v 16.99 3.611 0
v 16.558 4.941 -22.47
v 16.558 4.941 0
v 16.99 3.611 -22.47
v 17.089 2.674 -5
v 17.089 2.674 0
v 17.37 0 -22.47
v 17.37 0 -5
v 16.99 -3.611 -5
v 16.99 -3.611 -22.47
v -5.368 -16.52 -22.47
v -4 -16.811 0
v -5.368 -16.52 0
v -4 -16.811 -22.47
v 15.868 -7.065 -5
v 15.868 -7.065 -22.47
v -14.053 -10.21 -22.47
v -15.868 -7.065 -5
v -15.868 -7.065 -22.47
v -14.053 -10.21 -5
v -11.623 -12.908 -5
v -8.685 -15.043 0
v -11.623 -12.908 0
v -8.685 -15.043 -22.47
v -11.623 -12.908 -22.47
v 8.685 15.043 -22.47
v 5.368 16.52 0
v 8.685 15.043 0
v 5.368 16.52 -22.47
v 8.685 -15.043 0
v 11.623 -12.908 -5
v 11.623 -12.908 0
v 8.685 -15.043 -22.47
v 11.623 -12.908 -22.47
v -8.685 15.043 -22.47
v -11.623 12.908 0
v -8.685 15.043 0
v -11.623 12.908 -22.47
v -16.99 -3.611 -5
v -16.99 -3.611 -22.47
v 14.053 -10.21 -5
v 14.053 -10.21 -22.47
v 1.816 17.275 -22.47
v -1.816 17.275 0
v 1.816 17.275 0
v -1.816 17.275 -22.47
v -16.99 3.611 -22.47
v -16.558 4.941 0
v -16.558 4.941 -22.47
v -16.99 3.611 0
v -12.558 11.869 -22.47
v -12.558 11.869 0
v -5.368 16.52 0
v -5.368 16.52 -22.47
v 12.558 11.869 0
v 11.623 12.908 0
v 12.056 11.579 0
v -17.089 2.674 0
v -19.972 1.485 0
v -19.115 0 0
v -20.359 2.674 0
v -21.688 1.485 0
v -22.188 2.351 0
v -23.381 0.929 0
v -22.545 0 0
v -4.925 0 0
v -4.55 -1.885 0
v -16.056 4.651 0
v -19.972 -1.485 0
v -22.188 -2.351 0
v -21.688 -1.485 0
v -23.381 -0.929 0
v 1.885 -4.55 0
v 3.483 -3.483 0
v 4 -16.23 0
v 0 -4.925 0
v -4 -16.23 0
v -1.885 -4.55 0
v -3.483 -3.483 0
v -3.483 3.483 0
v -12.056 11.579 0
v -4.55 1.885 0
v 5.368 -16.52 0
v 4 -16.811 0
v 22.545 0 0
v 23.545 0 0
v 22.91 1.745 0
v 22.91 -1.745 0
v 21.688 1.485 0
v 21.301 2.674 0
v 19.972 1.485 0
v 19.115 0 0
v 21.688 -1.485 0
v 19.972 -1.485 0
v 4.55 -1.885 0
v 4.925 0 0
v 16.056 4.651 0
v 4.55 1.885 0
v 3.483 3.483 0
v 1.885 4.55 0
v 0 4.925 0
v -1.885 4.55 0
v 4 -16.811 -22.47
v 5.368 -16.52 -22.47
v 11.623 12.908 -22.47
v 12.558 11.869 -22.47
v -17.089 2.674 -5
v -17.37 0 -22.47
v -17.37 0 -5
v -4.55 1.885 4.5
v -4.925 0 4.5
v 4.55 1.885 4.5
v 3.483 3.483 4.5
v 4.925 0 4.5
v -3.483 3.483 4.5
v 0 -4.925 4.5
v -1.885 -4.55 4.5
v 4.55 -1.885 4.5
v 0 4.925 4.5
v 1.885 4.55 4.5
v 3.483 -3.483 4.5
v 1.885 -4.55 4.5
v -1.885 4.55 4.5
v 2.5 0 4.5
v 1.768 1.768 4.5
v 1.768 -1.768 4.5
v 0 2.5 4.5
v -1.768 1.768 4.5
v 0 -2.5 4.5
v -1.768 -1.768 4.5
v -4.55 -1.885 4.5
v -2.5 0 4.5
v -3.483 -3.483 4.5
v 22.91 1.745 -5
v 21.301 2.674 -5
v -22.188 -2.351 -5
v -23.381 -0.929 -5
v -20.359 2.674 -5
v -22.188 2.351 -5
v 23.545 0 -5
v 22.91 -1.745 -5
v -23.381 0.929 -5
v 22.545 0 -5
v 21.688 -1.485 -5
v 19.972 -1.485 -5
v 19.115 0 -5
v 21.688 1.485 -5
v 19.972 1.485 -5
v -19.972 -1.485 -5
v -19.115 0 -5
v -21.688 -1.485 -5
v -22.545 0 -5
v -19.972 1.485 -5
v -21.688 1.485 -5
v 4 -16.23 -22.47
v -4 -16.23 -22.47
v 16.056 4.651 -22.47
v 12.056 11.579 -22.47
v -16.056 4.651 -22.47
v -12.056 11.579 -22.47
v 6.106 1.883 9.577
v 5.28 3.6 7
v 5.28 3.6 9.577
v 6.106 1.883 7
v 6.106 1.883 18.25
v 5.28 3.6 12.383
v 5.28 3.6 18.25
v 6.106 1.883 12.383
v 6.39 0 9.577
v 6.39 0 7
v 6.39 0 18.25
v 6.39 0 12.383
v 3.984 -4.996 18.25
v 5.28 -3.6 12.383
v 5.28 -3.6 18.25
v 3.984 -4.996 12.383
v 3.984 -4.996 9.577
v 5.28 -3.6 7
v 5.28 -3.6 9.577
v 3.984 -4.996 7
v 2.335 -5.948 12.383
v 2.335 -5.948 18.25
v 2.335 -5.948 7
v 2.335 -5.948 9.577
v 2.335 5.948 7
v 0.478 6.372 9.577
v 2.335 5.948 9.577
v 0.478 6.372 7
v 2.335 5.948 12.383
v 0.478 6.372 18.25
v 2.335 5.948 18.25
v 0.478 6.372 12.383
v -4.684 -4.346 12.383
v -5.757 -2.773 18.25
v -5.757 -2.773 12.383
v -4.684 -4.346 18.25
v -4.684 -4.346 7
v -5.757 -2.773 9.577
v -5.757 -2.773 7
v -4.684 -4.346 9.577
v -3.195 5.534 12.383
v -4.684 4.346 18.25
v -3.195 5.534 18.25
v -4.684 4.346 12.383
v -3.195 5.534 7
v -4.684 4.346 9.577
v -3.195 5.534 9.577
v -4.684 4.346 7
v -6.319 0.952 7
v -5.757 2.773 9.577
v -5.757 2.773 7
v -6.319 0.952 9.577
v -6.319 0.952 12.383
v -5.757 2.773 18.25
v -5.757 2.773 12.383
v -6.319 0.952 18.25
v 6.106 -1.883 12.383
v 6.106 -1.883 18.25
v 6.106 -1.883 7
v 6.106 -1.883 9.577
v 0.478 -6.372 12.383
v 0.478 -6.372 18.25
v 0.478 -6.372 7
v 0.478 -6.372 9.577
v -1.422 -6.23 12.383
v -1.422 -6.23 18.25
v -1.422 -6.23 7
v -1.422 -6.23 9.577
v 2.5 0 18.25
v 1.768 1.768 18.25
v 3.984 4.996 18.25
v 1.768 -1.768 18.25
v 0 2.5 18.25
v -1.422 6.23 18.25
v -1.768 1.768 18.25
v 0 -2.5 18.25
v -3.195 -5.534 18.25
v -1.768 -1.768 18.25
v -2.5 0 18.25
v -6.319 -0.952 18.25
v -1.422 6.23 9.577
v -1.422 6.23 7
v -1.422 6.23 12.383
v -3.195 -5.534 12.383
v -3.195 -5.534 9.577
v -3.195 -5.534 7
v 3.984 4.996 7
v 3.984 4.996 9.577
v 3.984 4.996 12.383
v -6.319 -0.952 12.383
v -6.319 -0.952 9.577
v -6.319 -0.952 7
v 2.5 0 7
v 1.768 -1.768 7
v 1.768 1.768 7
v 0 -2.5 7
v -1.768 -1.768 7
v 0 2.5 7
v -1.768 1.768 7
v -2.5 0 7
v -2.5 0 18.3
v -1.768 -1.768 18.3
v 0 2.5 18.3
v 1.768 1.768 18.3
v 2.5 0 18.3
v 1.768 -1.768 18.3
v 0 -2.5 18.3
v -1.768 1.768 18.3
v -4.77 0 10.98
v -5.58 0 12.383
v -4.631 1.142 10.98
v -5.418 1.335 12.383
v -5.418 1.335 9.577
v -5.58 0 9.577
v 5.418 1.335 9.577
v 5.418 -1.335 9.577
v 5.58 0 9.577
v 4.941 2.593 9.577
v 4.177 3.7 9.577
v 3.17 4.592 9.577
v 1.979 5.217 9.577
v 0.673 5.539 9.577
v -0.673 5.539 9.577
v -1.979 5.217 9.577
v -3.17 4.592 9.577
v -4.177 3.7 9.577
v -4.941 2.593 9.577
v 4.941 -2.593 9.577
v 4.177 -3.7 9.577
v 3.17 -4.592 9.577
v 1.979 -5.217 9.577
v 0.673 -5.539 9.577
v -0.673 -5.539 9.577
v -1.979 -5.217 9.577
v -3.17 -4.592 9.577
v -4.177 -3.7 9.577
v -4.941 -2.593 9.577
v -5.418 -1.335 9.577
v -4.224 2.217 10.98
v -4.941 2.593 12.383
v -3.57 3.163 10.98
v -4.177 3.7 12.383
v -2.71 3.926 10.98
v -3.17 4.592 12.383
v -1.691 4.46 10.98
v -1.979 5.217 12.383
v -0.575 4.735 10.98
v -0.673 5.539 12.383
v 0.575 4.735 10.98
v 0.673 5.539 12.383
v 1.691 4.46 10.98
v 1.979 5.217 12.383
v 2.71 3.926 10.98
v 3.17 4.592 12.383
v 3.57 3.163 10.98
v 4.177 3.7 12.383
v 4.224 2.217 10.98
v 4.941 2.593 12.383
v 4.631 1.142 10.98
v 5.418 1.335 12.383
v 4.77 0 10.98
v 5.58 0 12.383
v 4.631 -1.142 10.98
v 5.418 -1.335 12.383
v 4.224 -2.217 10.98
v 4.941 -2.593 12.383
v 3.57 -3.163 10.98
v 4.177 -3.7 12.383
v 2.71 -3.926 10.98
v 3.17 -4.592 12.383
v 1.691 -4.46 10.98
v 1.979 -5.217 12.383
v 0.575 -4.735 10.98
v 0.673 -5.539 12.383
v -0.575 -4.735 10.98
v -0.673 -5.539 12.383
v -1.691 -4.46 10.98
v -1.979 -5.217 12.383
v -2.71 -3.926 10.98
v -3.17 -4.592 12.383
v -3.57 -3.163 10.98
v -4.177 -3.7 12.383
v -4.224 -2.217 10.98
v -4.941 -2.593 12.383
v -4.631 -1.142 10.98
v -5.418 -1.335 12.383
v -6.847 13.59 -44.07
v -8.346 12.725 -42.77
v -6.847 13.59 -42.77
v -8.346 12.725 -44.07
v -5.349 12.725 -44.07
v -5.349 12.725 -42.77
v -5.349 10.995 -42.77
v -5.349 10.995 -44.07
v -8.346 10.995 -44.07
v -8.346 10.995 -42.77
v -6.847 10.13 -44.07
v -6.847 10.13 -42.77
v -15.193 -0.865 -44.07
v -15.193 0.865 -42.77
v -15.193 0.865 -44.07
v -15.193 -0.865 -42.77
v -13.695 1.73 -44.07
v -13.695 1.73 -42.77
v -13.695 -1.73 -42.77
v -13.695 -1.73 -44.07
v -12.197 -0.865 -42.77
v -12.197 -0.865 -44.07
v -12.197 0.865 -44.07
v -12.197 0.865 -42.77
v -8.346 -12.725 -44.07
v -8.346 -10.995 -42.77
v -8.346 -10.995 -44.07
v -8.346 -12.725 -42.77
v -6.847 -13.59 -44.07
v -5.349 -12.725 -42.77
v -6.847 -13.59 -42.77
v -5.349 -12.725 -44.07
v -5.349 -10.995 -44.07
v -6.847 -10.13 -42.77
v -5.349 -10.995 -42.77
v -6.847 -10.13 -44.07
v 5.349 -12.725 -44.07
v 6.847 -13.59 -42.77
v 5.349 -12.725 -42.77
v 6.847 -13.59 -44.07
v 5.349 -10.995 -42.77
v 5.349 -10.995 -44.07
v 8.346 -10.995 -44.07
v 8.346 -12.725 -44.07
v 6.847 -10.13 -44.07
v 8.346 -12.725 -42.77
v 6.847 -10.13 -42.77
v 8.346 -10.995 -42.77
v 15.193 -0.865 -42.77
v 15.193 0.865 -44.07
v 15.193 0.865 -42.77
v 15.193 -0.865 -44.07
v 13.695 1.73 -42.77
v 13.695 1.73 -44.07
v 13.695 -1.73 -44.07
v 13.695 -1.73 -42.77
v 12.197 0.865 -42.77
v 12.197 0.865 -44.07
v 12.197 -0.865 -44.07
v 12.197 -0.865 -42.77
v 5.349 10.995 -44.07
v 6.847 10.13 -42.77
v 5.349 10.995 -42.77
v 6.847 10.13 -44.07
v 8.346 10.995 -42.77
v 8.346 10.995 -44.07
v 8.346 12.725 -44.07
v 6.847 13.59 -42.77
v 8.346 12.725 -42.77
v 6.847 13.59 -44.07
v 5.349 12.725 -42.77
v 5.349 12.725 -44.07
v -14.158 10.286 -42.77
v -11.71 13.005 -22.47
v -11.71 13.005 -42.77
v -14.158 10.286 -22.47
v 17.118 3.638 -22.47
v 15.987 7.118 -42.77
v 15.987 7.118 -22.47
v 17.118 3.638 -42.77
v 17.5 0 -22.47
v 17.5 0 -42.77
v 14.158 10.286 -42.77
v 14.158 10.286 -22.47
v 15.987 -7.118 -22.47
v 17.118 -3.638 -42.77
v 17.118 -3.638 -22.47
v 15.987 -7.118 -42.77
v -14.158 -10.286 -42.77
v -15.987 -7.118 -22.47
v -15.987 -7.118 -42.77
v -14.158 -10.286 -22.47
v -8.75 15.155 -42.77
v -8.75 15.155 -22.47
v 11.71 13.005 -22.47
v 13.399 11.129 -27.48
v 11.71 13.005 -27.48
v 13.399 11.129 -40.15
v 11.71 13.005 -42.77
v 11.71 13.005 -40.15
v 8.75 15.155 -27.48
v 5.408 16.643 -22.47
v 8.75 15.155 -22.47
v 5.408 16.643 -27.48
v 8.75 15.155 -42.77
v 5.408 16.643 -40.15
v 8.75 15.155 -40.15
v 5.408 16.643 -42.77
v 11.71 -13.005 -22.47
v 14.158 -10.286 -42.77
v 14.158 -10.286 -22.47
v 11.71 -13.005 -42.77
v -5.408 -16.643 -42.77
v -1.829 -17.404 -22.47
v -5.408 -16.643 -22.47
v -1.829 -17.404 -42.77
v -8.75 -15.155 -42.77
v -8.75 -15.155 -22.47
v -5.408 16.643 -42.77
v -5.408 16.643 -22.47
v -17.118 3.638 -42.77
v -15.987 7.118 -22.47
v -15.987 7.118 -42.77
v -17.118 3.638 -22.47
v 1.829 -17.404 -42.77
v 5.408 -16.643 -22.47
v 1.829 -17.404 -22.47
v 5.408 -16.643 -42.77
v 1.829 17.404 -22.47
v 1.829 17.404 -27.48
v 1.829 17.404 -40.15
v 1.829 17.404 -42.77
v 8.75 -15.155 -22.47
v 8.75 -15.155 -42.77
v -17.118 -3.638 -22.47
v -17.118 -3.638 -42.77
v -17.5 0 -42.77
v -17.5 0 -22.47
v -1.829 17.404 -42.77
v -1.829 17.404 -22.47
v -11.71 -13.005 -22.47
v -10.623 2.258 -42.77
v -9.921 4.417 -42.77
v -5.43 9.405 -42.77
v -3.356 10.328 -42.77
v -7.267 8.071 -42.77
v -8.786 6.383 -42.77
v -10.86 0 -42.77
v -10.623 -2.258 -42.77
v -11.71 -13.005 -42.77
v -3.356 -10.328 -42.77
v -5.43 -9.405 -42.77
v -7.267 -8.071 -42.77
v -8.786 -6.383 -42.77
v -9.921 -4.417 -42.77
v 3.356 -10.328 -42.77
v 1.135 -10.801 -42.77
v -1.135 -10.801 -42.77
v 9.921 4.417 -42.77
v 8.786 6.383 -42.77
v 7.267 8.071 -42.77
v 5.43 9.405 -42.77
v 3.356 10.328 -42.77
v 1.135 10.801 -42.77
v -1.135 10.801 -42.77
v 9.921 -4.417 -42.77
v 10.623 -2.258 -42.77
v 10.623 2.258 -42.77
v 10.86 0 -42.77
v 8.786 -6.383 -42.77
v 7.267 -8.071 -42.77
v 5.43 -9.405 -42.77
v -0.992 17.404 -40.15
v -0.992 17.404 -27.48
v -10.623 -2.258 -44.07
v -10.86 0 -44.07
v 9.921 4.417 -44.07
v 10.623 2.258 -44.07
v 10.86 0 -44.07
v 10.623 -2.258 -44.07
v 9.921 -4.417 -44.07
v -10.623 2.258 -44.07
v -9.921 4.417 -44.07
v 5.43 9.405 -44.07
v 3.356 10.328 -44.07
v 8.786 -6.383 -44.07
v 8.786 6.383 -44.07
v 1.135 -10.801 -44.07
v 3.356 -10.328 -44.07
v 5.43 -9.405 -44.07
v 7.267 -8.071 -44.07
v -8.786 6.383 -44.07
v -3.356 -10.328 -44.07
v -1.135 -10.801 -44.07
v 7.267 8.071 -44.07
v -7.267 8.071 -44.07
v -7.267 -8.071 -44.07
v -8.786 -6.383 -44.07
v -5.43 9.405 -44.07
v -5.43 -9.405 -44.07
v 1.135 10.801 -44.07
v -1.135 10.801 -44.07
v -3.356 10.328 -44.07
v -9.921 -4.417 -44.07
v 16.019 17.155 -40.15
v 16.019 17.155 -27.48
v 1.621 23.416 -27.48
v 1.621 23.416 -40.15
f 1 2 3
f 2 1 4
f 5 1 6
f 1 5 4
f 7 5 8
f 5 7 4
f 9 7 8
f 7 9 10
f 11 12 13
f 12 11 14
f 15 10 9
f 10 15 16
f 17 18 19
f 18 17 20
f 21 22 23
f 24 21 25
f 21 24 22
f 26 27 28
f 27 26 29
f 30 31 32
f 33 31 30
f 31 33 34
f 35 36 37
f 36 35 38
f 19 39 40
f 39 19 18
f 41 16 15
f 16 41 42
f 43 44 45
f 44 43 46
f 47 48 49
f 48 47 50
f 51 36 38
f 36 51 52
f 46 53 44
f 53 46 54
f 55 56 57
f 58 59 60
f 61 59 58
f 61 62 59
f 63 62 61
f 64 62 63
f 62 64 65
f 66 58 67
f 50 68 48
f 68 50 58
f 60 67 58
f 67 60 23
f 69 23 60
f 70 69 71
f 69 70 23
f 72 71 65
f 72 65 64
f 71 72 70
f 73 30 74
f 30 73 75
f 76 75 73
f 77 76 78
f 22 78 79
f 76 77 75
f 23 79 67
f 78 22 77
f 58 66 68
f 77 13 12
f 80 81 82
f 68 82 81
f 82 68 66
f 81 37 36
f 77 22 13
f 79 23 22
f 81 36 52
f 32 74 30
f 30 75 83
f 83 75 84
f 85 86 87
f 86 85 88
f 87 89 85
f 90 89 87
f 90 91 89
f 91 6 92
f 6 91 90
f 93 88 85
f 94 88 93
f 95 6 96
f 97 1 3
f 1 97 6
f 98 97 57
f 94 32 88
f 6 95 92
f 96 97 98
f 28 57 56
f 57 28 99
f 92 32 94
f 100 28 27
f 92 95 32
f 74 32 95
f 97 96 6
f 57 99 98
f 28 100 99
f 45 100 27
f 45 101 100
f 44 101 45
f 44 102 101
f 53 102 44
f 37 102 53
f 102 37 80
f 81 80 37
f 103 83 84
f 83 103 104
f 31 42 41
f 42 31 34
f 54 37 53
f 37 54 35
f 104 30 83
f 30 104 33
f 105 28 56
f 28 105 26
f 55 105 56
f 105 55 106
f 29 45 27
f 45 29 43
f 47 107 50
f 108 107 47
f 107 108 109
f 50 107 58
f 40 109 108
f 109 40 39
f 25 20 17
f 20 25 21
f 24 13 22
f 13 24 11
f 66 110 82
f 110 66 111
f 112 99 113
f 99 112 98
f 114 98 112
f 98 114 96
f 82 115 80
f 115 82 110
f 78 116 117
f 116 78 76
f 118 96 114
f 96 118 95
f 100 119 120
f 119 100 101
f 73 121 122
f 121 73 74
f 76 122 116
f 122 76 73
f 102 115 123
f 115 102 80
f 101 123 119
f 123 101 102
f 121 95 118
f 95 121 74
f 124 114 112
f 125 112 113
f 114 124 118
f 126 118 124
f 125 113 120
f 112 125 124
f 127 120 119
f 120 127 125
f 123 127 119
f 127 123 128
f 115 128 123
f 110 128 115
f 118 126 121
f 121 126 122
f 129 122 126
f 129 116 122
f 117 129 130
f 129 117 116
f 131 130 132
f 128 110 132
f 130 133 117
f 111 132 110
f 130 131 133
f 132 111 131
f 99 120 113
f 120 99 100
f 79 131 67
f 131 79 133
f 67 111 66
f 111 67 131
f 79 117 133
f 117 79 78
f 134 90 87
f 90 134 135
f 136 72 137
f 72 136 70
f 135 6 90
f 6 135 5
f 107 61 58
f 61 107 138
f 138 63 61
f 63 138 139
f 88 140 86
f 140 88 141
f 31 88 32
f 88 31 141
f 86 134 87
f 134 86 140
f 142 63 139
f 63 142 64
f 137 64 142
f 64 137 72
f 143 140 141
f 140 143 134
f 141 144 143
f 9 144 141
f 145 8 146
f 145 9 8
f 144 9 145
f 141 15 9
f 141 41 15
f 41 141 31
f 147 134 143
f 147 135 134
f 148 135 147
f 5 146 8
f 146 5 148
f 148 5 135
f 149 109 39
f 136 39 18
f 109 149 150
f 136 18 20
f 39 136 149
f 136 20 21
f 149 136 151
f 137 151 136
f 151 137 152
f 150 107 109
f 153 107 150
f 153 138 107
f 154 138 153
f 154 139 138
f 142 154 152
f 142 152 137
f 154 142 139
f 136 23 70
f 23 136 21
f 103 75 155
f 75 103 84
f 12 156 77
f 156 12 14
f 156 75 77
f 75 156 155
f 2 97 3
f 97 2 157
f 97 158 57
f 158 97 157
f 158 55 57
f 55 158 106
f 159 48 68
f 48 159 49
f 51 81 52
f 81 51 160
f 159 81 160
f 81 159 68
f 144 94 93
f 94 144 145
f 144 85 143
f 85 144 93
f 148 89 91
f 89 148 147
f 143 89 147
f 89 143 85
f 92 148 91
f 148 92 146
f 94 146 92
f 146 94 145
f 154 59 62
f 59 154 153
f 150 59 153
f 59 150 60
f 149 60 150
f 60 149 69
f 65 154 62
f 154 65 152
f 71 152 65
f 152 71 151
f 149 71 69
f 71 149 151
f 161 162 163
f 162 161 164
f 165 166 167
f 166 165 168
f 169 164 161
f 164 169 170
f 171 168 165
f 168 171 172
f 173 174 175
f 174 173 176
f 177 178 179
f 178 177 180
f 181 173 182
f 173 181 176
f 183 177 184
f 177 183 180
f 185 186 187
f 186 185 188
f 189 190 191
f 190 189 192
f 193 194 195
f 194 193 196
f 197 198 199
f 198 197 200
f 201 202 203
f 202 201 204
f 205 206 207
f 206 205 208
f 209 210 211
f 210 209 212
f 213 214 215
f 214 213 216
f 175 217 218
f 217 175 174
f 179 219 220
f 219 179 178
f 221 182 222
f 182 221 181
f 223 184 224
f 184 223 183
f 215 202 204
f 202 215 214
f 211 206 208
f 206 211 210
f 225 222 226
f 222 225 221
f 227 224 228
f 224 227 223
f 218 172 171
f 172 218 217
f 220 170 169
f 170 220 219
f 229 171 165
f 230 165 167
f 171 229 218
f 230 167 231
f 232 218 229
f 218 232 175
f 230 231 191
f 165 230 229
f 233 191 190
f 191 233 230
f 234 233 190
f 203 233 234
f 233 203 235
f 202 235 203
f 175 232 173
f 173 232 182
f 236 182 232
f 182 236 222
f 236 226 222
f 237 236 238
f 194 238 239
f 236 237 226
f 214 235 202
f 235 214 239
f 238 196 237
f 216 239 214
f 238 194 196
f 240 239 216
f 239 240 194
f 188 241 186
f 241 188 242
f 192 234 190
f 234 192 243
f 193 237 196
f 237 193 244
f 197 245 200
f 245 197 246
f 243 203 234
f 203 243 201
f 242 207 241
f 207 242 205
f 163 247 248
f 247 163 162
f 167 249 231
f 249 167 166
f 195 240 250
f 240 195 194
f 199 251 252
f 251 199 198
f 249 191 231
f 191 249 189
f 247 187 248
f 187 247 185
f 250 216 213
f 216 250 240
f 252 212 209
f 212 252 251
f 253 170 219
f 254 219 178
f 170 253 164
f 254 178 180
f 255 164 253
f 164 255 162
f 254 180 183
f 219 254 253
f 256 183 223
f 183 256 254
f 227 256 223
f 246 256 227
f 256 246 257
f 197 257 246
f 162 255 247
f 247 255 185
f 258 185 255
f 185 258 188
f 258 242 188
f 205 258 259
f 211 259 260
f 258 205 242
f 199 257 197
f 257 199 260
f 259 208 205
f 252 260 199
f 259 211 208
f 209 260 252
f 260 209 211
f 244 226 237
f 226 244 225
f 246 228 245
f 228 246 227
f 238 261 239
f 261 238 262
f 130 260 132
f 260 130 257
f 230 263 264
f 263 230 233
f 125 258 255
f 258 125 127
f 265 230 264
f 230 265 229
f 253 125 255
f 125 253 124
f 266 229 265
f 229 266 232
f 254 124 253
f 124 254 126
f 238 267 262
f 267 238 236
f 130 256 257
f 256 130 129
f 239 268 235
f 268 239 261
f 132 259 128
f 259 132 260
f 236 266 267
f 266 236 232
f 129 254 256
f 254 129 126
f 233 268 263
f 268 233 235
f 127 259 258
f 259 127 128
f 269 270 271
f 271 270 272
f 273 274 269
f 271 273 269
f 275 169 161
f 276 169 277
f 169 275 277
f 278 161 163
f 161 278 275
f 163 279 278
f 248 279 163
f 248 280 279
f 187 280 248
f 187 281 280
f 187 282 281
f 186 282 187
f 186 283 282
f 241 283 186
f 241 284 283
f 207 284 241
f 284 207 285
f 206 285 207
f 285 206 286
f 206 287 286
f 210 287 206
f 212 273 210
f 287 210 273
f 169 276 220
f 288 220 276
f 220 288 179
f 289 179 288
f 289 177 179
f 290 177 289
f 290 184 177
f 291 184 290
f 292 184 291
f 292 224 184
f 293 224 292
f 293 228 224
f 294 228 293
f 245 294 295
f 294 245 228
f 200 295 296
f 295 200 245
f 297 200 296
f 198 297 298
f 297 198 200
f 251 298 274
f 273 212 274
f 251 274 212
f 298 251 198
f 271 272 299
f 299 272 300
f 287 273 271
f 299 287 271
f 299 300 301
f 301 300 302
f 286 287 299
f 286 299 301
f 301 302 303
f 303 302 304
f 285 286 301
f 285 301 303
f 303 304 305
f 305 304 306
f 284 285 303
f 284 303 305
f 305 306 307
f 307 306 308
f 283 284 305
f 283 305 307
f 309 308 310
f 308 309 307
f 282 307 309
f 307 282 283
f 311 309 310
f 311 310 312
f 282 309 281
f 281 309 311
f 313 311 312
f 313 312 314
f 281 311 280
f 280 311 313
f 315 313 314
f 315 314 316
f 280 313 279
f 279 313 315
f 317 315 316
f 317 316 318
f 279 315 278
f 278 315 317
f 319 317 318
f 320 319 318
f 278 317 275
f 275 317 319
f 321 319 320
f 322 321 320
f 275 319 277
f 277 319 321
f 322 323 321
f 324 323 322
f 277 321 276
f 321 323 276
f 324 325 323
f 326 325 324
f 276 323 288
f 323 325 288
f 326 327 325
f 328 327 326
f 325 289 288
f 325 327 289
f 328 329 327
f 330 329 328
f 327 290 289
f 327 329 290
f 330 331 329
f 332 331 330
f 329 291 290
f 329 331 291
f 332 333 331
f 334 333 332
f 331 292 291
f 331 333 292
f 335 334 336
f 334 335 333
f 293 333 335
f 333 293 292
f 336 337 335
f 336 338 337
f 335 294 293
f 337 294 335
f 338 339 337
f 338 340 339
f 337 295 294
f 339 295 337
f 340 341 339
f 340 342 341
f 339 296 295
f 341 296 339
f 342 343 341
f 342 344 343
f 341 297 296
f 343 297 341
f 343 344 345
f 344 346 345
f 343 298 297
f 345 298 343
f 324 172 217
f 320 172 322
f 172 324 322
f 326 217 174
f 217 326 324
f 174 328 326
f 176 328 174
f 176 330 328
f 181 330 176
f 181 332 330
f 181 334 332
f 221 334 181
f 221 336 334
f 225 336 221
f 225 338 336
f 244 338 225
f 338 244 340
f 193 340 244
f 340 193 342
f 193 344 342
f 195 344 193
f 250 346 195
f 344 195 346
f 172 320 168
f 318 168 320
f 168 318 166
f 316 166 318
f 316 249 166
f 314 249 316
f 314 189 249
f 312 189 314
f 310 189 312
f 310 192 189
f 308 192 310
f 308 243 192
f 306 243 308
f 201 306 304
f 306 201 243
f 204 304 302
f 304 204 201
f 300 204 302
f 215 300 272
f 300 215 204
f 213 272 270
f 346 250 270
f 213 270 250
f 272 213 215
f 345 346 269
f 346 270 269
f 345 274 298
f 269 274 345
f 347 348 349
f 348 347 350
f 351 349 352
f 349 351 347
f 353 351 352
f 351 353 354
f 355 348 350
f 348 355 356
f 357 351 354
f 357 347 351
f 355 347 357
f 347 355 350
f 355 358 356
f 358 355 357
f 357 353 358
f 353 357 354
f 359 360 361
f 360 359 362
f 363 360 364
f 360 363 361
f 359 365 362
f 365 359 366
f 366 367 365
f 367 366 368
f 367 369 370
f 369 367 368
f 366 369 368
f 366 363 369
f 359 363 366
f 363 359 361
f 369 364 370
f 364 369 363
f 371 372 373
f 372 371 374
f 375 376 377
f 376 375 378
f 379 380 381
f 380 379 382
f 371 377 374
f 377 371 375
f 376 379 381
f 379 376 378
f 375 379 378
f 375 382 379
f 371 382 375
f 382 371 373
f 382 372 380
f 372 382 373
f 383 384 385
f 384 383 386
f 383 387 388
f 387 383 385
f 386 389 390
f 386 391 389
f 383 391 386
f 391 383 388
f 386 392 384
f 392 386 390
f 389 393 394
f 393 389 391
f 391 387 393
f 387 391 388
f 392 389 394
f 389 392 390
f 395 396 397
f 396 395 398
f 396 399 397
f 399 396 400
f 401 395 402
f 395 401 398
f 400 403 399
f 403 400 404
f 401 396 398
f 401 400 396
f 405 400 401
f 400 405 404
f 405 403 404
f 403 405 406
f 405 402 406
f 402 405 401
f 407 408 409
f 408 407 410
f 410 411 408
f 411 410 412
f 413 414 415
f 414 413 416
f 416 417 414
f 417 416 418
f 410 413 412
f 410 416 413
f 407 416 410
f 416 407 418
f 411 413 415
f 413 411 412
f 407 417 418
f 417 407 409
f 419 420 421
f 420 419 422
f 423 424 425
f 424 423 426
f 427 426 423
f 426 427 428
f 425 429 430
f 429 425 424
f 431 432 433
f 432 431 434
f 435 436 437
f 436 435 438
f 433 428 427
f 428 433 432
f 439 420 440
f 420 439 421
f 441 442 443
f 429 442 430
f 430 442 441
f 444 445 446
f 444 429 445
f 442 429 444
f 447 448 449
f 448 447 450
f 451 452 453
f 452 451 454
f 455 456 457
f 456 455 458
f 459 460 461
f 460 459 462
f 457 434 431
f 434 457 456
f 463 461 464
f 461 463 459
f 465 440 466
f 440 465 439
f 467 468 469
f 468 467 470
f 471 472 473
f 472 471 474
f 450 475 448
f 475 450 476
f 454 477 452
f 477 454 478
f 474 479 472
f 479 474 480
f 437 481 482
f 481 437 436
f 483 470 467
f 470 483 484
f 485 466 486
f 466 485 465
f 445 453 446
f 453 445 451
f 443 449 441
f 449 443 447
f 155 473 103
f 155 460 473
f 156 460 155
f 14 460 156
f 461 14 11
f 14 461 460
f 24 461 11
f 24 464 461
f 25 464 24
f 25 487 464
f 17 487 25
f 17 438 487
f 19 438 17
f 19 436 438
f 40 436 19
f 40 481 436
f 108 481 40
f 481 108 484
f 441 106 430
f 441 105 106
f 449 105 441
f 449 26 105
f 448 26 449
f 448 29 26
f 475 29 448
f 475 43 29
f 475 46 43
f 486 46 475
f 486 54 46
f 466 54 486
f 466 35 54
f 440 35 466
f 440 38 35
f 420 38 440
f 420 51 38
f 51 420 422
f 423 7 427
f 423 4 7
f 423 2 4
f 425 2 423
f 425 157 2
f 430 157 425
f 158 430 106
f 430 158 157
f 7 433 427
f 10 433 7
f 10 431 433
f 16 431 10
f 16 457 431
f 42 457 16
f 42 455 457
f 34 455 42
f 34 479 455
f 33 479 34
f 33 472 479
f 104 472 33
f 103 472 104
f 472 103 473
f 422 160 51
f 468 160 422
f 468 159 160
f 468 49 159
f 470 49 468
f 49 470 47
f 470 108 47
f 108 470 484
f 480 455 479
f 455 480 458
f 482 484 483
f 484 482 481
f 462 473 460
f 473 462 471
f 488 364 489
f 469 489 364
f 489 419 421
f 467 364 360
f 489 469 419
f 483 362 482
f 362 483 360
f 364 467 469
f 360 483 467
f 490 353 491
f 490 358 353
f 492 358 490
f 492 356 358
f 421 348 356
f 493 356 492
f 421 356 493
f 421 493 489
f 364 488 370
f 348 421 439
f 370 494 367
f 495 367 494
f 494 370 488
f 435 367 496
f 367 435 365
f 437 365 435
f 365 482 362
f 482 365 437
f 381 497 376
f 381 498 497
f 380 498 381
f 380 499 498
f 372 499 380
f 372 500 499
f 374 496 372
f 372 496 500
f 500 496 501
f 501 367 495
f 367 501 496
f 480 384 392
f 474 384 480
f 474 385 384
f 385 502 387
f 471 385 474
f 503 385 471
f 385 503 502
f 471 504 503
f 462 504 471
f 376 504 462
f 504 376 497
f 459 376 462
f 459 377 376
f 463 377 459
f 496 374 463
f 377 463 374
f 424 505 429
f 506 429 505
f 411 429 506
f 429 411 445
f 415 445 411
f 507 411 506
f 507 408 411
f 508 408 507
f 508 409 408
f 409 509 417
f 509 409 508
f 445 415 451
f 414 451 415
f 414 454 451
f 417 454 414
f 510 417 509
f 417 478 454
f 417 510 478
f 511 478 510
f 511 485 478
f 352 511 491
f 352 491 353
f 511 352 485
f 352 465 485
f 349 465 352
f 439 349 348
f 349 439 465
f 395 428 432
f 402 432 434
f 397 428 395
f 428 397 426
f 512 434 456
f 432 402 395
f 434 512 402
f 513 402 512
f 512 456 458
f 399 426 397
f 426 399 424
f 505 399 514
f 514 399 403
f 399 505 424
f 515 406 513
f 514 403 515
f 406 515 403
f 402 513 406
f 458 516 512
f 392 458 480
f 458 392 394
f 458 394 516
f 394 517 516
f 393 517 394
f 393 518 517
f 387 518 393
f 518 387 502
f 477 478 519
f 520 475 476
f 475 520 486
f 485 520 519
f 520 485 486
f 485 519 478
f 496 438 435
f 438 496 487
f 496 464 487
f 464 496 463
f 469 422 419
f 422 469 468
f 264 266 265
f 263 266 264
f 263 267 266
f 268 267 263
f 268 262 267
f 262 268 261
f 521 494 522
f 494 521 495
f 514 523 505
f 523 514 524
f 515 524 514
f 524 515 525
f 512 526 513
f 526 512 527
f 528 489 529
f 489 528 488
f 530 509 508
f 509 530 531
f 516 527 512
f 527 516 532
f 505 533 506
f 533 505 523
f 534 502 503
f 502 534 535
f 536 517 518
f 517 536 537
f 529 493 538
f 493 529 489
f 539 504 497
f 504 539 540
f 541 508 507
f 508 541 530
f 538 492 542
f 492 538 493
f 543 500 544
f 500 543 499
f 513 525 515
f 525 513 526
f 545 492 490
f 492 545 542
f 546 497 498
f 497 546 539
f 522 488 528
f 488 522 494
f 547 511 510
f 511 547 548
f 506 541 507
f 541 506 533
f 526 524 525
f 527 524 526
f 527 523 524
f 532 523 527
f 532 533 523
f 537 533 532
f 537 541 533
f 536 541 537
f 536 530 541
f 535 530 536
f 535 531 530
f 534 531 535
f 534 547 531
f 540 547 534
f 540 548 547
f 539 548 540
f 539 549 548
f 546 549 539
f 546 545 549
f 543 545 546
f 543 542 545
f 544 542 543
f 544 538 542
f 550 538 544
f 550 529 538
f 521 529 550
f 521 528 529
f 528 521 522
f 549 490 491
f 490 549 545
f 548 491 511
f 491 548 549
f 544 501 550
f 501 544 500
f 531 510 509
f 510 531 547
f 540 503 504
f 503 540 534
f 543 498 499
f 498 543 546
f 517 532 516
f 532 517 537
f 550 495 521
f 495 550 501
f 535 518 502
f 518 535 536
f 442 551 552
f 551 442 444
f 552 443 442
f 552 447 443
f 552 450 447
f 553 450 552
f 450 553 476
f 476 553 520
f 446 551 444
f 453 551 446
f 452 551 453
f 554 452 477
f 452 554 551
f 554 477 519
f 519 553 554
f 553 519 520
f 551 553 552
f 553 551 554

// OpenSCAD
//eMinebea PG35L-048-USC0

motor_d   = 35;
motor_l   = 20.3;

gearbox_d = 34.74;
gearbox_l = 22.47;
collar_l  = 4.5;
collar_d  = 9.85;
shaft_d   = 5;
shaft_l   = 18.3; //from gearbox face
shaft_back_d = 2;
shaft_back_l = 2.12; //from back face
back_circle_d = 21.72;
back_circle_l = 1.3;

//@ 30, 90, 150, 210, 270, 330
back_6smallcircles_d = 3.46;
back_6smallcircles_l = 1;
back_6smallcircles_centerpos_d = 30.85 - back_6smallcircles_d;

hobbed_d = 12.78;
hobbed_l = 11.25;
hobbed_minor_d = 11.16;
hobbed_minor_y = hobbed_l-7.27;
hobbed_dist_from_face = 7;

//@ 0, 120, 240
cuts_3_w = 8;
cuts_3_depth = gearbox_d - 33.6;

mounttabs_hd = 3.43;
mounttabs_t = 5;
mounttabs_w = 2;
mounttabs_l = 41.66;


wirebox_p = 27.48; //dist from mounting face
wirebox_l = 12.67;
wirebox_w = 15.7;
wirebox_t = 39.62-motor_d;
wirebox_a = -23.5;

module motor(){
	union(){

		color("silver")
		translate([0,0,-(gearbox_l+motor_l)])
		cylinder(r=motor_d/2, h=motor_l);

		color("ivory")
		difference(){
			union(){
				translate([0,0,-(gearbox_l+.1)])
				cylinder(r=gearbox_d/2, h=gearbox_l+.1);

				translate([0,0,-gearbox_l])
				cylinder(r=collar_d/2, h=collar_l+gearbox_l);

				hull(){
					translate([mounttabs_l/2,0,-mounttabs_t])
					cylinder(r=(mounttabs_hd+mounttabs_w)/2, h=mounttabs_t);
					translate([-mounttabs_l/2,0,-mounttabs_t])
					cylinder(r=(mounttabs_hd+mounttabs_w)/2, h=mounttabs_t);
					translate([0,0,-mounttabs_t])
					intersection(){
						cylinder(r=gearbox_d/2, h=mounttabs_t);
						translate([0,-500,0])
						cube([1000,1000,1000], center=true);
					}
				}
			}
			for (r=[0:120:240])
			rotate([0,0,r])
			translate([0,cuts_3_depth-gearbox_d/2-500,0])
			cube([cuts_3_w, 1000, 1000], center=true);

			translate([mounttabs_l/2,0,0])
			cylinder(r=mounttabs_hd/2, h=mounttabs_t*3, center=true);
			translate([-mounttabs_l/2,0,0])
			cylinder(r=mounttabs_hd/2, h=mounttabs_t*3, center=true);

		}

		color("silver")
		cylinder(r=shaft_d/2, h=shaft_l);

		color("silver")
		translate([0,0,hobbed_dist_from_face])
		difference(){
			cylinder(r=hobbed_d/2, h=hobbed_l);
	
			cylinder(r=shaft_d/2, h=hobbed_l*3, center=true);

			rotate_extrude(convexity = 10)
			translate([hobbed_d/2, hobbed_minor_y, 0])
			circle(r = hobbed_d-hobbed_minor_d);		
		}


		color("ivory")
		translate([0,0,-(gearbox_l+back_circle_l+motor_l)])
		cylinder(r=back_circle_d/2, h=back_circle_l+motor_l);

		color("ivory")
			for (r=[30:60:359])
			rotate([0,0,r])
			translate([0,back_6smallcircles_centerpos_d/2,-(gearbox_l+back_circle_l+motor_l)])
			cylinder(r=back_6smallcircles_d/2, h=back_6smallcircles_l+motor_l);
		
		color("ivory")
		rotate([0,0,wirebox_a])
		translate([-wirebox_w/2,0,-wirebox_p-wirebox_l])
		cube([wirebox_w, wirebox_t+motor_d/2, wirebox_l]);

	}

}

motor();
